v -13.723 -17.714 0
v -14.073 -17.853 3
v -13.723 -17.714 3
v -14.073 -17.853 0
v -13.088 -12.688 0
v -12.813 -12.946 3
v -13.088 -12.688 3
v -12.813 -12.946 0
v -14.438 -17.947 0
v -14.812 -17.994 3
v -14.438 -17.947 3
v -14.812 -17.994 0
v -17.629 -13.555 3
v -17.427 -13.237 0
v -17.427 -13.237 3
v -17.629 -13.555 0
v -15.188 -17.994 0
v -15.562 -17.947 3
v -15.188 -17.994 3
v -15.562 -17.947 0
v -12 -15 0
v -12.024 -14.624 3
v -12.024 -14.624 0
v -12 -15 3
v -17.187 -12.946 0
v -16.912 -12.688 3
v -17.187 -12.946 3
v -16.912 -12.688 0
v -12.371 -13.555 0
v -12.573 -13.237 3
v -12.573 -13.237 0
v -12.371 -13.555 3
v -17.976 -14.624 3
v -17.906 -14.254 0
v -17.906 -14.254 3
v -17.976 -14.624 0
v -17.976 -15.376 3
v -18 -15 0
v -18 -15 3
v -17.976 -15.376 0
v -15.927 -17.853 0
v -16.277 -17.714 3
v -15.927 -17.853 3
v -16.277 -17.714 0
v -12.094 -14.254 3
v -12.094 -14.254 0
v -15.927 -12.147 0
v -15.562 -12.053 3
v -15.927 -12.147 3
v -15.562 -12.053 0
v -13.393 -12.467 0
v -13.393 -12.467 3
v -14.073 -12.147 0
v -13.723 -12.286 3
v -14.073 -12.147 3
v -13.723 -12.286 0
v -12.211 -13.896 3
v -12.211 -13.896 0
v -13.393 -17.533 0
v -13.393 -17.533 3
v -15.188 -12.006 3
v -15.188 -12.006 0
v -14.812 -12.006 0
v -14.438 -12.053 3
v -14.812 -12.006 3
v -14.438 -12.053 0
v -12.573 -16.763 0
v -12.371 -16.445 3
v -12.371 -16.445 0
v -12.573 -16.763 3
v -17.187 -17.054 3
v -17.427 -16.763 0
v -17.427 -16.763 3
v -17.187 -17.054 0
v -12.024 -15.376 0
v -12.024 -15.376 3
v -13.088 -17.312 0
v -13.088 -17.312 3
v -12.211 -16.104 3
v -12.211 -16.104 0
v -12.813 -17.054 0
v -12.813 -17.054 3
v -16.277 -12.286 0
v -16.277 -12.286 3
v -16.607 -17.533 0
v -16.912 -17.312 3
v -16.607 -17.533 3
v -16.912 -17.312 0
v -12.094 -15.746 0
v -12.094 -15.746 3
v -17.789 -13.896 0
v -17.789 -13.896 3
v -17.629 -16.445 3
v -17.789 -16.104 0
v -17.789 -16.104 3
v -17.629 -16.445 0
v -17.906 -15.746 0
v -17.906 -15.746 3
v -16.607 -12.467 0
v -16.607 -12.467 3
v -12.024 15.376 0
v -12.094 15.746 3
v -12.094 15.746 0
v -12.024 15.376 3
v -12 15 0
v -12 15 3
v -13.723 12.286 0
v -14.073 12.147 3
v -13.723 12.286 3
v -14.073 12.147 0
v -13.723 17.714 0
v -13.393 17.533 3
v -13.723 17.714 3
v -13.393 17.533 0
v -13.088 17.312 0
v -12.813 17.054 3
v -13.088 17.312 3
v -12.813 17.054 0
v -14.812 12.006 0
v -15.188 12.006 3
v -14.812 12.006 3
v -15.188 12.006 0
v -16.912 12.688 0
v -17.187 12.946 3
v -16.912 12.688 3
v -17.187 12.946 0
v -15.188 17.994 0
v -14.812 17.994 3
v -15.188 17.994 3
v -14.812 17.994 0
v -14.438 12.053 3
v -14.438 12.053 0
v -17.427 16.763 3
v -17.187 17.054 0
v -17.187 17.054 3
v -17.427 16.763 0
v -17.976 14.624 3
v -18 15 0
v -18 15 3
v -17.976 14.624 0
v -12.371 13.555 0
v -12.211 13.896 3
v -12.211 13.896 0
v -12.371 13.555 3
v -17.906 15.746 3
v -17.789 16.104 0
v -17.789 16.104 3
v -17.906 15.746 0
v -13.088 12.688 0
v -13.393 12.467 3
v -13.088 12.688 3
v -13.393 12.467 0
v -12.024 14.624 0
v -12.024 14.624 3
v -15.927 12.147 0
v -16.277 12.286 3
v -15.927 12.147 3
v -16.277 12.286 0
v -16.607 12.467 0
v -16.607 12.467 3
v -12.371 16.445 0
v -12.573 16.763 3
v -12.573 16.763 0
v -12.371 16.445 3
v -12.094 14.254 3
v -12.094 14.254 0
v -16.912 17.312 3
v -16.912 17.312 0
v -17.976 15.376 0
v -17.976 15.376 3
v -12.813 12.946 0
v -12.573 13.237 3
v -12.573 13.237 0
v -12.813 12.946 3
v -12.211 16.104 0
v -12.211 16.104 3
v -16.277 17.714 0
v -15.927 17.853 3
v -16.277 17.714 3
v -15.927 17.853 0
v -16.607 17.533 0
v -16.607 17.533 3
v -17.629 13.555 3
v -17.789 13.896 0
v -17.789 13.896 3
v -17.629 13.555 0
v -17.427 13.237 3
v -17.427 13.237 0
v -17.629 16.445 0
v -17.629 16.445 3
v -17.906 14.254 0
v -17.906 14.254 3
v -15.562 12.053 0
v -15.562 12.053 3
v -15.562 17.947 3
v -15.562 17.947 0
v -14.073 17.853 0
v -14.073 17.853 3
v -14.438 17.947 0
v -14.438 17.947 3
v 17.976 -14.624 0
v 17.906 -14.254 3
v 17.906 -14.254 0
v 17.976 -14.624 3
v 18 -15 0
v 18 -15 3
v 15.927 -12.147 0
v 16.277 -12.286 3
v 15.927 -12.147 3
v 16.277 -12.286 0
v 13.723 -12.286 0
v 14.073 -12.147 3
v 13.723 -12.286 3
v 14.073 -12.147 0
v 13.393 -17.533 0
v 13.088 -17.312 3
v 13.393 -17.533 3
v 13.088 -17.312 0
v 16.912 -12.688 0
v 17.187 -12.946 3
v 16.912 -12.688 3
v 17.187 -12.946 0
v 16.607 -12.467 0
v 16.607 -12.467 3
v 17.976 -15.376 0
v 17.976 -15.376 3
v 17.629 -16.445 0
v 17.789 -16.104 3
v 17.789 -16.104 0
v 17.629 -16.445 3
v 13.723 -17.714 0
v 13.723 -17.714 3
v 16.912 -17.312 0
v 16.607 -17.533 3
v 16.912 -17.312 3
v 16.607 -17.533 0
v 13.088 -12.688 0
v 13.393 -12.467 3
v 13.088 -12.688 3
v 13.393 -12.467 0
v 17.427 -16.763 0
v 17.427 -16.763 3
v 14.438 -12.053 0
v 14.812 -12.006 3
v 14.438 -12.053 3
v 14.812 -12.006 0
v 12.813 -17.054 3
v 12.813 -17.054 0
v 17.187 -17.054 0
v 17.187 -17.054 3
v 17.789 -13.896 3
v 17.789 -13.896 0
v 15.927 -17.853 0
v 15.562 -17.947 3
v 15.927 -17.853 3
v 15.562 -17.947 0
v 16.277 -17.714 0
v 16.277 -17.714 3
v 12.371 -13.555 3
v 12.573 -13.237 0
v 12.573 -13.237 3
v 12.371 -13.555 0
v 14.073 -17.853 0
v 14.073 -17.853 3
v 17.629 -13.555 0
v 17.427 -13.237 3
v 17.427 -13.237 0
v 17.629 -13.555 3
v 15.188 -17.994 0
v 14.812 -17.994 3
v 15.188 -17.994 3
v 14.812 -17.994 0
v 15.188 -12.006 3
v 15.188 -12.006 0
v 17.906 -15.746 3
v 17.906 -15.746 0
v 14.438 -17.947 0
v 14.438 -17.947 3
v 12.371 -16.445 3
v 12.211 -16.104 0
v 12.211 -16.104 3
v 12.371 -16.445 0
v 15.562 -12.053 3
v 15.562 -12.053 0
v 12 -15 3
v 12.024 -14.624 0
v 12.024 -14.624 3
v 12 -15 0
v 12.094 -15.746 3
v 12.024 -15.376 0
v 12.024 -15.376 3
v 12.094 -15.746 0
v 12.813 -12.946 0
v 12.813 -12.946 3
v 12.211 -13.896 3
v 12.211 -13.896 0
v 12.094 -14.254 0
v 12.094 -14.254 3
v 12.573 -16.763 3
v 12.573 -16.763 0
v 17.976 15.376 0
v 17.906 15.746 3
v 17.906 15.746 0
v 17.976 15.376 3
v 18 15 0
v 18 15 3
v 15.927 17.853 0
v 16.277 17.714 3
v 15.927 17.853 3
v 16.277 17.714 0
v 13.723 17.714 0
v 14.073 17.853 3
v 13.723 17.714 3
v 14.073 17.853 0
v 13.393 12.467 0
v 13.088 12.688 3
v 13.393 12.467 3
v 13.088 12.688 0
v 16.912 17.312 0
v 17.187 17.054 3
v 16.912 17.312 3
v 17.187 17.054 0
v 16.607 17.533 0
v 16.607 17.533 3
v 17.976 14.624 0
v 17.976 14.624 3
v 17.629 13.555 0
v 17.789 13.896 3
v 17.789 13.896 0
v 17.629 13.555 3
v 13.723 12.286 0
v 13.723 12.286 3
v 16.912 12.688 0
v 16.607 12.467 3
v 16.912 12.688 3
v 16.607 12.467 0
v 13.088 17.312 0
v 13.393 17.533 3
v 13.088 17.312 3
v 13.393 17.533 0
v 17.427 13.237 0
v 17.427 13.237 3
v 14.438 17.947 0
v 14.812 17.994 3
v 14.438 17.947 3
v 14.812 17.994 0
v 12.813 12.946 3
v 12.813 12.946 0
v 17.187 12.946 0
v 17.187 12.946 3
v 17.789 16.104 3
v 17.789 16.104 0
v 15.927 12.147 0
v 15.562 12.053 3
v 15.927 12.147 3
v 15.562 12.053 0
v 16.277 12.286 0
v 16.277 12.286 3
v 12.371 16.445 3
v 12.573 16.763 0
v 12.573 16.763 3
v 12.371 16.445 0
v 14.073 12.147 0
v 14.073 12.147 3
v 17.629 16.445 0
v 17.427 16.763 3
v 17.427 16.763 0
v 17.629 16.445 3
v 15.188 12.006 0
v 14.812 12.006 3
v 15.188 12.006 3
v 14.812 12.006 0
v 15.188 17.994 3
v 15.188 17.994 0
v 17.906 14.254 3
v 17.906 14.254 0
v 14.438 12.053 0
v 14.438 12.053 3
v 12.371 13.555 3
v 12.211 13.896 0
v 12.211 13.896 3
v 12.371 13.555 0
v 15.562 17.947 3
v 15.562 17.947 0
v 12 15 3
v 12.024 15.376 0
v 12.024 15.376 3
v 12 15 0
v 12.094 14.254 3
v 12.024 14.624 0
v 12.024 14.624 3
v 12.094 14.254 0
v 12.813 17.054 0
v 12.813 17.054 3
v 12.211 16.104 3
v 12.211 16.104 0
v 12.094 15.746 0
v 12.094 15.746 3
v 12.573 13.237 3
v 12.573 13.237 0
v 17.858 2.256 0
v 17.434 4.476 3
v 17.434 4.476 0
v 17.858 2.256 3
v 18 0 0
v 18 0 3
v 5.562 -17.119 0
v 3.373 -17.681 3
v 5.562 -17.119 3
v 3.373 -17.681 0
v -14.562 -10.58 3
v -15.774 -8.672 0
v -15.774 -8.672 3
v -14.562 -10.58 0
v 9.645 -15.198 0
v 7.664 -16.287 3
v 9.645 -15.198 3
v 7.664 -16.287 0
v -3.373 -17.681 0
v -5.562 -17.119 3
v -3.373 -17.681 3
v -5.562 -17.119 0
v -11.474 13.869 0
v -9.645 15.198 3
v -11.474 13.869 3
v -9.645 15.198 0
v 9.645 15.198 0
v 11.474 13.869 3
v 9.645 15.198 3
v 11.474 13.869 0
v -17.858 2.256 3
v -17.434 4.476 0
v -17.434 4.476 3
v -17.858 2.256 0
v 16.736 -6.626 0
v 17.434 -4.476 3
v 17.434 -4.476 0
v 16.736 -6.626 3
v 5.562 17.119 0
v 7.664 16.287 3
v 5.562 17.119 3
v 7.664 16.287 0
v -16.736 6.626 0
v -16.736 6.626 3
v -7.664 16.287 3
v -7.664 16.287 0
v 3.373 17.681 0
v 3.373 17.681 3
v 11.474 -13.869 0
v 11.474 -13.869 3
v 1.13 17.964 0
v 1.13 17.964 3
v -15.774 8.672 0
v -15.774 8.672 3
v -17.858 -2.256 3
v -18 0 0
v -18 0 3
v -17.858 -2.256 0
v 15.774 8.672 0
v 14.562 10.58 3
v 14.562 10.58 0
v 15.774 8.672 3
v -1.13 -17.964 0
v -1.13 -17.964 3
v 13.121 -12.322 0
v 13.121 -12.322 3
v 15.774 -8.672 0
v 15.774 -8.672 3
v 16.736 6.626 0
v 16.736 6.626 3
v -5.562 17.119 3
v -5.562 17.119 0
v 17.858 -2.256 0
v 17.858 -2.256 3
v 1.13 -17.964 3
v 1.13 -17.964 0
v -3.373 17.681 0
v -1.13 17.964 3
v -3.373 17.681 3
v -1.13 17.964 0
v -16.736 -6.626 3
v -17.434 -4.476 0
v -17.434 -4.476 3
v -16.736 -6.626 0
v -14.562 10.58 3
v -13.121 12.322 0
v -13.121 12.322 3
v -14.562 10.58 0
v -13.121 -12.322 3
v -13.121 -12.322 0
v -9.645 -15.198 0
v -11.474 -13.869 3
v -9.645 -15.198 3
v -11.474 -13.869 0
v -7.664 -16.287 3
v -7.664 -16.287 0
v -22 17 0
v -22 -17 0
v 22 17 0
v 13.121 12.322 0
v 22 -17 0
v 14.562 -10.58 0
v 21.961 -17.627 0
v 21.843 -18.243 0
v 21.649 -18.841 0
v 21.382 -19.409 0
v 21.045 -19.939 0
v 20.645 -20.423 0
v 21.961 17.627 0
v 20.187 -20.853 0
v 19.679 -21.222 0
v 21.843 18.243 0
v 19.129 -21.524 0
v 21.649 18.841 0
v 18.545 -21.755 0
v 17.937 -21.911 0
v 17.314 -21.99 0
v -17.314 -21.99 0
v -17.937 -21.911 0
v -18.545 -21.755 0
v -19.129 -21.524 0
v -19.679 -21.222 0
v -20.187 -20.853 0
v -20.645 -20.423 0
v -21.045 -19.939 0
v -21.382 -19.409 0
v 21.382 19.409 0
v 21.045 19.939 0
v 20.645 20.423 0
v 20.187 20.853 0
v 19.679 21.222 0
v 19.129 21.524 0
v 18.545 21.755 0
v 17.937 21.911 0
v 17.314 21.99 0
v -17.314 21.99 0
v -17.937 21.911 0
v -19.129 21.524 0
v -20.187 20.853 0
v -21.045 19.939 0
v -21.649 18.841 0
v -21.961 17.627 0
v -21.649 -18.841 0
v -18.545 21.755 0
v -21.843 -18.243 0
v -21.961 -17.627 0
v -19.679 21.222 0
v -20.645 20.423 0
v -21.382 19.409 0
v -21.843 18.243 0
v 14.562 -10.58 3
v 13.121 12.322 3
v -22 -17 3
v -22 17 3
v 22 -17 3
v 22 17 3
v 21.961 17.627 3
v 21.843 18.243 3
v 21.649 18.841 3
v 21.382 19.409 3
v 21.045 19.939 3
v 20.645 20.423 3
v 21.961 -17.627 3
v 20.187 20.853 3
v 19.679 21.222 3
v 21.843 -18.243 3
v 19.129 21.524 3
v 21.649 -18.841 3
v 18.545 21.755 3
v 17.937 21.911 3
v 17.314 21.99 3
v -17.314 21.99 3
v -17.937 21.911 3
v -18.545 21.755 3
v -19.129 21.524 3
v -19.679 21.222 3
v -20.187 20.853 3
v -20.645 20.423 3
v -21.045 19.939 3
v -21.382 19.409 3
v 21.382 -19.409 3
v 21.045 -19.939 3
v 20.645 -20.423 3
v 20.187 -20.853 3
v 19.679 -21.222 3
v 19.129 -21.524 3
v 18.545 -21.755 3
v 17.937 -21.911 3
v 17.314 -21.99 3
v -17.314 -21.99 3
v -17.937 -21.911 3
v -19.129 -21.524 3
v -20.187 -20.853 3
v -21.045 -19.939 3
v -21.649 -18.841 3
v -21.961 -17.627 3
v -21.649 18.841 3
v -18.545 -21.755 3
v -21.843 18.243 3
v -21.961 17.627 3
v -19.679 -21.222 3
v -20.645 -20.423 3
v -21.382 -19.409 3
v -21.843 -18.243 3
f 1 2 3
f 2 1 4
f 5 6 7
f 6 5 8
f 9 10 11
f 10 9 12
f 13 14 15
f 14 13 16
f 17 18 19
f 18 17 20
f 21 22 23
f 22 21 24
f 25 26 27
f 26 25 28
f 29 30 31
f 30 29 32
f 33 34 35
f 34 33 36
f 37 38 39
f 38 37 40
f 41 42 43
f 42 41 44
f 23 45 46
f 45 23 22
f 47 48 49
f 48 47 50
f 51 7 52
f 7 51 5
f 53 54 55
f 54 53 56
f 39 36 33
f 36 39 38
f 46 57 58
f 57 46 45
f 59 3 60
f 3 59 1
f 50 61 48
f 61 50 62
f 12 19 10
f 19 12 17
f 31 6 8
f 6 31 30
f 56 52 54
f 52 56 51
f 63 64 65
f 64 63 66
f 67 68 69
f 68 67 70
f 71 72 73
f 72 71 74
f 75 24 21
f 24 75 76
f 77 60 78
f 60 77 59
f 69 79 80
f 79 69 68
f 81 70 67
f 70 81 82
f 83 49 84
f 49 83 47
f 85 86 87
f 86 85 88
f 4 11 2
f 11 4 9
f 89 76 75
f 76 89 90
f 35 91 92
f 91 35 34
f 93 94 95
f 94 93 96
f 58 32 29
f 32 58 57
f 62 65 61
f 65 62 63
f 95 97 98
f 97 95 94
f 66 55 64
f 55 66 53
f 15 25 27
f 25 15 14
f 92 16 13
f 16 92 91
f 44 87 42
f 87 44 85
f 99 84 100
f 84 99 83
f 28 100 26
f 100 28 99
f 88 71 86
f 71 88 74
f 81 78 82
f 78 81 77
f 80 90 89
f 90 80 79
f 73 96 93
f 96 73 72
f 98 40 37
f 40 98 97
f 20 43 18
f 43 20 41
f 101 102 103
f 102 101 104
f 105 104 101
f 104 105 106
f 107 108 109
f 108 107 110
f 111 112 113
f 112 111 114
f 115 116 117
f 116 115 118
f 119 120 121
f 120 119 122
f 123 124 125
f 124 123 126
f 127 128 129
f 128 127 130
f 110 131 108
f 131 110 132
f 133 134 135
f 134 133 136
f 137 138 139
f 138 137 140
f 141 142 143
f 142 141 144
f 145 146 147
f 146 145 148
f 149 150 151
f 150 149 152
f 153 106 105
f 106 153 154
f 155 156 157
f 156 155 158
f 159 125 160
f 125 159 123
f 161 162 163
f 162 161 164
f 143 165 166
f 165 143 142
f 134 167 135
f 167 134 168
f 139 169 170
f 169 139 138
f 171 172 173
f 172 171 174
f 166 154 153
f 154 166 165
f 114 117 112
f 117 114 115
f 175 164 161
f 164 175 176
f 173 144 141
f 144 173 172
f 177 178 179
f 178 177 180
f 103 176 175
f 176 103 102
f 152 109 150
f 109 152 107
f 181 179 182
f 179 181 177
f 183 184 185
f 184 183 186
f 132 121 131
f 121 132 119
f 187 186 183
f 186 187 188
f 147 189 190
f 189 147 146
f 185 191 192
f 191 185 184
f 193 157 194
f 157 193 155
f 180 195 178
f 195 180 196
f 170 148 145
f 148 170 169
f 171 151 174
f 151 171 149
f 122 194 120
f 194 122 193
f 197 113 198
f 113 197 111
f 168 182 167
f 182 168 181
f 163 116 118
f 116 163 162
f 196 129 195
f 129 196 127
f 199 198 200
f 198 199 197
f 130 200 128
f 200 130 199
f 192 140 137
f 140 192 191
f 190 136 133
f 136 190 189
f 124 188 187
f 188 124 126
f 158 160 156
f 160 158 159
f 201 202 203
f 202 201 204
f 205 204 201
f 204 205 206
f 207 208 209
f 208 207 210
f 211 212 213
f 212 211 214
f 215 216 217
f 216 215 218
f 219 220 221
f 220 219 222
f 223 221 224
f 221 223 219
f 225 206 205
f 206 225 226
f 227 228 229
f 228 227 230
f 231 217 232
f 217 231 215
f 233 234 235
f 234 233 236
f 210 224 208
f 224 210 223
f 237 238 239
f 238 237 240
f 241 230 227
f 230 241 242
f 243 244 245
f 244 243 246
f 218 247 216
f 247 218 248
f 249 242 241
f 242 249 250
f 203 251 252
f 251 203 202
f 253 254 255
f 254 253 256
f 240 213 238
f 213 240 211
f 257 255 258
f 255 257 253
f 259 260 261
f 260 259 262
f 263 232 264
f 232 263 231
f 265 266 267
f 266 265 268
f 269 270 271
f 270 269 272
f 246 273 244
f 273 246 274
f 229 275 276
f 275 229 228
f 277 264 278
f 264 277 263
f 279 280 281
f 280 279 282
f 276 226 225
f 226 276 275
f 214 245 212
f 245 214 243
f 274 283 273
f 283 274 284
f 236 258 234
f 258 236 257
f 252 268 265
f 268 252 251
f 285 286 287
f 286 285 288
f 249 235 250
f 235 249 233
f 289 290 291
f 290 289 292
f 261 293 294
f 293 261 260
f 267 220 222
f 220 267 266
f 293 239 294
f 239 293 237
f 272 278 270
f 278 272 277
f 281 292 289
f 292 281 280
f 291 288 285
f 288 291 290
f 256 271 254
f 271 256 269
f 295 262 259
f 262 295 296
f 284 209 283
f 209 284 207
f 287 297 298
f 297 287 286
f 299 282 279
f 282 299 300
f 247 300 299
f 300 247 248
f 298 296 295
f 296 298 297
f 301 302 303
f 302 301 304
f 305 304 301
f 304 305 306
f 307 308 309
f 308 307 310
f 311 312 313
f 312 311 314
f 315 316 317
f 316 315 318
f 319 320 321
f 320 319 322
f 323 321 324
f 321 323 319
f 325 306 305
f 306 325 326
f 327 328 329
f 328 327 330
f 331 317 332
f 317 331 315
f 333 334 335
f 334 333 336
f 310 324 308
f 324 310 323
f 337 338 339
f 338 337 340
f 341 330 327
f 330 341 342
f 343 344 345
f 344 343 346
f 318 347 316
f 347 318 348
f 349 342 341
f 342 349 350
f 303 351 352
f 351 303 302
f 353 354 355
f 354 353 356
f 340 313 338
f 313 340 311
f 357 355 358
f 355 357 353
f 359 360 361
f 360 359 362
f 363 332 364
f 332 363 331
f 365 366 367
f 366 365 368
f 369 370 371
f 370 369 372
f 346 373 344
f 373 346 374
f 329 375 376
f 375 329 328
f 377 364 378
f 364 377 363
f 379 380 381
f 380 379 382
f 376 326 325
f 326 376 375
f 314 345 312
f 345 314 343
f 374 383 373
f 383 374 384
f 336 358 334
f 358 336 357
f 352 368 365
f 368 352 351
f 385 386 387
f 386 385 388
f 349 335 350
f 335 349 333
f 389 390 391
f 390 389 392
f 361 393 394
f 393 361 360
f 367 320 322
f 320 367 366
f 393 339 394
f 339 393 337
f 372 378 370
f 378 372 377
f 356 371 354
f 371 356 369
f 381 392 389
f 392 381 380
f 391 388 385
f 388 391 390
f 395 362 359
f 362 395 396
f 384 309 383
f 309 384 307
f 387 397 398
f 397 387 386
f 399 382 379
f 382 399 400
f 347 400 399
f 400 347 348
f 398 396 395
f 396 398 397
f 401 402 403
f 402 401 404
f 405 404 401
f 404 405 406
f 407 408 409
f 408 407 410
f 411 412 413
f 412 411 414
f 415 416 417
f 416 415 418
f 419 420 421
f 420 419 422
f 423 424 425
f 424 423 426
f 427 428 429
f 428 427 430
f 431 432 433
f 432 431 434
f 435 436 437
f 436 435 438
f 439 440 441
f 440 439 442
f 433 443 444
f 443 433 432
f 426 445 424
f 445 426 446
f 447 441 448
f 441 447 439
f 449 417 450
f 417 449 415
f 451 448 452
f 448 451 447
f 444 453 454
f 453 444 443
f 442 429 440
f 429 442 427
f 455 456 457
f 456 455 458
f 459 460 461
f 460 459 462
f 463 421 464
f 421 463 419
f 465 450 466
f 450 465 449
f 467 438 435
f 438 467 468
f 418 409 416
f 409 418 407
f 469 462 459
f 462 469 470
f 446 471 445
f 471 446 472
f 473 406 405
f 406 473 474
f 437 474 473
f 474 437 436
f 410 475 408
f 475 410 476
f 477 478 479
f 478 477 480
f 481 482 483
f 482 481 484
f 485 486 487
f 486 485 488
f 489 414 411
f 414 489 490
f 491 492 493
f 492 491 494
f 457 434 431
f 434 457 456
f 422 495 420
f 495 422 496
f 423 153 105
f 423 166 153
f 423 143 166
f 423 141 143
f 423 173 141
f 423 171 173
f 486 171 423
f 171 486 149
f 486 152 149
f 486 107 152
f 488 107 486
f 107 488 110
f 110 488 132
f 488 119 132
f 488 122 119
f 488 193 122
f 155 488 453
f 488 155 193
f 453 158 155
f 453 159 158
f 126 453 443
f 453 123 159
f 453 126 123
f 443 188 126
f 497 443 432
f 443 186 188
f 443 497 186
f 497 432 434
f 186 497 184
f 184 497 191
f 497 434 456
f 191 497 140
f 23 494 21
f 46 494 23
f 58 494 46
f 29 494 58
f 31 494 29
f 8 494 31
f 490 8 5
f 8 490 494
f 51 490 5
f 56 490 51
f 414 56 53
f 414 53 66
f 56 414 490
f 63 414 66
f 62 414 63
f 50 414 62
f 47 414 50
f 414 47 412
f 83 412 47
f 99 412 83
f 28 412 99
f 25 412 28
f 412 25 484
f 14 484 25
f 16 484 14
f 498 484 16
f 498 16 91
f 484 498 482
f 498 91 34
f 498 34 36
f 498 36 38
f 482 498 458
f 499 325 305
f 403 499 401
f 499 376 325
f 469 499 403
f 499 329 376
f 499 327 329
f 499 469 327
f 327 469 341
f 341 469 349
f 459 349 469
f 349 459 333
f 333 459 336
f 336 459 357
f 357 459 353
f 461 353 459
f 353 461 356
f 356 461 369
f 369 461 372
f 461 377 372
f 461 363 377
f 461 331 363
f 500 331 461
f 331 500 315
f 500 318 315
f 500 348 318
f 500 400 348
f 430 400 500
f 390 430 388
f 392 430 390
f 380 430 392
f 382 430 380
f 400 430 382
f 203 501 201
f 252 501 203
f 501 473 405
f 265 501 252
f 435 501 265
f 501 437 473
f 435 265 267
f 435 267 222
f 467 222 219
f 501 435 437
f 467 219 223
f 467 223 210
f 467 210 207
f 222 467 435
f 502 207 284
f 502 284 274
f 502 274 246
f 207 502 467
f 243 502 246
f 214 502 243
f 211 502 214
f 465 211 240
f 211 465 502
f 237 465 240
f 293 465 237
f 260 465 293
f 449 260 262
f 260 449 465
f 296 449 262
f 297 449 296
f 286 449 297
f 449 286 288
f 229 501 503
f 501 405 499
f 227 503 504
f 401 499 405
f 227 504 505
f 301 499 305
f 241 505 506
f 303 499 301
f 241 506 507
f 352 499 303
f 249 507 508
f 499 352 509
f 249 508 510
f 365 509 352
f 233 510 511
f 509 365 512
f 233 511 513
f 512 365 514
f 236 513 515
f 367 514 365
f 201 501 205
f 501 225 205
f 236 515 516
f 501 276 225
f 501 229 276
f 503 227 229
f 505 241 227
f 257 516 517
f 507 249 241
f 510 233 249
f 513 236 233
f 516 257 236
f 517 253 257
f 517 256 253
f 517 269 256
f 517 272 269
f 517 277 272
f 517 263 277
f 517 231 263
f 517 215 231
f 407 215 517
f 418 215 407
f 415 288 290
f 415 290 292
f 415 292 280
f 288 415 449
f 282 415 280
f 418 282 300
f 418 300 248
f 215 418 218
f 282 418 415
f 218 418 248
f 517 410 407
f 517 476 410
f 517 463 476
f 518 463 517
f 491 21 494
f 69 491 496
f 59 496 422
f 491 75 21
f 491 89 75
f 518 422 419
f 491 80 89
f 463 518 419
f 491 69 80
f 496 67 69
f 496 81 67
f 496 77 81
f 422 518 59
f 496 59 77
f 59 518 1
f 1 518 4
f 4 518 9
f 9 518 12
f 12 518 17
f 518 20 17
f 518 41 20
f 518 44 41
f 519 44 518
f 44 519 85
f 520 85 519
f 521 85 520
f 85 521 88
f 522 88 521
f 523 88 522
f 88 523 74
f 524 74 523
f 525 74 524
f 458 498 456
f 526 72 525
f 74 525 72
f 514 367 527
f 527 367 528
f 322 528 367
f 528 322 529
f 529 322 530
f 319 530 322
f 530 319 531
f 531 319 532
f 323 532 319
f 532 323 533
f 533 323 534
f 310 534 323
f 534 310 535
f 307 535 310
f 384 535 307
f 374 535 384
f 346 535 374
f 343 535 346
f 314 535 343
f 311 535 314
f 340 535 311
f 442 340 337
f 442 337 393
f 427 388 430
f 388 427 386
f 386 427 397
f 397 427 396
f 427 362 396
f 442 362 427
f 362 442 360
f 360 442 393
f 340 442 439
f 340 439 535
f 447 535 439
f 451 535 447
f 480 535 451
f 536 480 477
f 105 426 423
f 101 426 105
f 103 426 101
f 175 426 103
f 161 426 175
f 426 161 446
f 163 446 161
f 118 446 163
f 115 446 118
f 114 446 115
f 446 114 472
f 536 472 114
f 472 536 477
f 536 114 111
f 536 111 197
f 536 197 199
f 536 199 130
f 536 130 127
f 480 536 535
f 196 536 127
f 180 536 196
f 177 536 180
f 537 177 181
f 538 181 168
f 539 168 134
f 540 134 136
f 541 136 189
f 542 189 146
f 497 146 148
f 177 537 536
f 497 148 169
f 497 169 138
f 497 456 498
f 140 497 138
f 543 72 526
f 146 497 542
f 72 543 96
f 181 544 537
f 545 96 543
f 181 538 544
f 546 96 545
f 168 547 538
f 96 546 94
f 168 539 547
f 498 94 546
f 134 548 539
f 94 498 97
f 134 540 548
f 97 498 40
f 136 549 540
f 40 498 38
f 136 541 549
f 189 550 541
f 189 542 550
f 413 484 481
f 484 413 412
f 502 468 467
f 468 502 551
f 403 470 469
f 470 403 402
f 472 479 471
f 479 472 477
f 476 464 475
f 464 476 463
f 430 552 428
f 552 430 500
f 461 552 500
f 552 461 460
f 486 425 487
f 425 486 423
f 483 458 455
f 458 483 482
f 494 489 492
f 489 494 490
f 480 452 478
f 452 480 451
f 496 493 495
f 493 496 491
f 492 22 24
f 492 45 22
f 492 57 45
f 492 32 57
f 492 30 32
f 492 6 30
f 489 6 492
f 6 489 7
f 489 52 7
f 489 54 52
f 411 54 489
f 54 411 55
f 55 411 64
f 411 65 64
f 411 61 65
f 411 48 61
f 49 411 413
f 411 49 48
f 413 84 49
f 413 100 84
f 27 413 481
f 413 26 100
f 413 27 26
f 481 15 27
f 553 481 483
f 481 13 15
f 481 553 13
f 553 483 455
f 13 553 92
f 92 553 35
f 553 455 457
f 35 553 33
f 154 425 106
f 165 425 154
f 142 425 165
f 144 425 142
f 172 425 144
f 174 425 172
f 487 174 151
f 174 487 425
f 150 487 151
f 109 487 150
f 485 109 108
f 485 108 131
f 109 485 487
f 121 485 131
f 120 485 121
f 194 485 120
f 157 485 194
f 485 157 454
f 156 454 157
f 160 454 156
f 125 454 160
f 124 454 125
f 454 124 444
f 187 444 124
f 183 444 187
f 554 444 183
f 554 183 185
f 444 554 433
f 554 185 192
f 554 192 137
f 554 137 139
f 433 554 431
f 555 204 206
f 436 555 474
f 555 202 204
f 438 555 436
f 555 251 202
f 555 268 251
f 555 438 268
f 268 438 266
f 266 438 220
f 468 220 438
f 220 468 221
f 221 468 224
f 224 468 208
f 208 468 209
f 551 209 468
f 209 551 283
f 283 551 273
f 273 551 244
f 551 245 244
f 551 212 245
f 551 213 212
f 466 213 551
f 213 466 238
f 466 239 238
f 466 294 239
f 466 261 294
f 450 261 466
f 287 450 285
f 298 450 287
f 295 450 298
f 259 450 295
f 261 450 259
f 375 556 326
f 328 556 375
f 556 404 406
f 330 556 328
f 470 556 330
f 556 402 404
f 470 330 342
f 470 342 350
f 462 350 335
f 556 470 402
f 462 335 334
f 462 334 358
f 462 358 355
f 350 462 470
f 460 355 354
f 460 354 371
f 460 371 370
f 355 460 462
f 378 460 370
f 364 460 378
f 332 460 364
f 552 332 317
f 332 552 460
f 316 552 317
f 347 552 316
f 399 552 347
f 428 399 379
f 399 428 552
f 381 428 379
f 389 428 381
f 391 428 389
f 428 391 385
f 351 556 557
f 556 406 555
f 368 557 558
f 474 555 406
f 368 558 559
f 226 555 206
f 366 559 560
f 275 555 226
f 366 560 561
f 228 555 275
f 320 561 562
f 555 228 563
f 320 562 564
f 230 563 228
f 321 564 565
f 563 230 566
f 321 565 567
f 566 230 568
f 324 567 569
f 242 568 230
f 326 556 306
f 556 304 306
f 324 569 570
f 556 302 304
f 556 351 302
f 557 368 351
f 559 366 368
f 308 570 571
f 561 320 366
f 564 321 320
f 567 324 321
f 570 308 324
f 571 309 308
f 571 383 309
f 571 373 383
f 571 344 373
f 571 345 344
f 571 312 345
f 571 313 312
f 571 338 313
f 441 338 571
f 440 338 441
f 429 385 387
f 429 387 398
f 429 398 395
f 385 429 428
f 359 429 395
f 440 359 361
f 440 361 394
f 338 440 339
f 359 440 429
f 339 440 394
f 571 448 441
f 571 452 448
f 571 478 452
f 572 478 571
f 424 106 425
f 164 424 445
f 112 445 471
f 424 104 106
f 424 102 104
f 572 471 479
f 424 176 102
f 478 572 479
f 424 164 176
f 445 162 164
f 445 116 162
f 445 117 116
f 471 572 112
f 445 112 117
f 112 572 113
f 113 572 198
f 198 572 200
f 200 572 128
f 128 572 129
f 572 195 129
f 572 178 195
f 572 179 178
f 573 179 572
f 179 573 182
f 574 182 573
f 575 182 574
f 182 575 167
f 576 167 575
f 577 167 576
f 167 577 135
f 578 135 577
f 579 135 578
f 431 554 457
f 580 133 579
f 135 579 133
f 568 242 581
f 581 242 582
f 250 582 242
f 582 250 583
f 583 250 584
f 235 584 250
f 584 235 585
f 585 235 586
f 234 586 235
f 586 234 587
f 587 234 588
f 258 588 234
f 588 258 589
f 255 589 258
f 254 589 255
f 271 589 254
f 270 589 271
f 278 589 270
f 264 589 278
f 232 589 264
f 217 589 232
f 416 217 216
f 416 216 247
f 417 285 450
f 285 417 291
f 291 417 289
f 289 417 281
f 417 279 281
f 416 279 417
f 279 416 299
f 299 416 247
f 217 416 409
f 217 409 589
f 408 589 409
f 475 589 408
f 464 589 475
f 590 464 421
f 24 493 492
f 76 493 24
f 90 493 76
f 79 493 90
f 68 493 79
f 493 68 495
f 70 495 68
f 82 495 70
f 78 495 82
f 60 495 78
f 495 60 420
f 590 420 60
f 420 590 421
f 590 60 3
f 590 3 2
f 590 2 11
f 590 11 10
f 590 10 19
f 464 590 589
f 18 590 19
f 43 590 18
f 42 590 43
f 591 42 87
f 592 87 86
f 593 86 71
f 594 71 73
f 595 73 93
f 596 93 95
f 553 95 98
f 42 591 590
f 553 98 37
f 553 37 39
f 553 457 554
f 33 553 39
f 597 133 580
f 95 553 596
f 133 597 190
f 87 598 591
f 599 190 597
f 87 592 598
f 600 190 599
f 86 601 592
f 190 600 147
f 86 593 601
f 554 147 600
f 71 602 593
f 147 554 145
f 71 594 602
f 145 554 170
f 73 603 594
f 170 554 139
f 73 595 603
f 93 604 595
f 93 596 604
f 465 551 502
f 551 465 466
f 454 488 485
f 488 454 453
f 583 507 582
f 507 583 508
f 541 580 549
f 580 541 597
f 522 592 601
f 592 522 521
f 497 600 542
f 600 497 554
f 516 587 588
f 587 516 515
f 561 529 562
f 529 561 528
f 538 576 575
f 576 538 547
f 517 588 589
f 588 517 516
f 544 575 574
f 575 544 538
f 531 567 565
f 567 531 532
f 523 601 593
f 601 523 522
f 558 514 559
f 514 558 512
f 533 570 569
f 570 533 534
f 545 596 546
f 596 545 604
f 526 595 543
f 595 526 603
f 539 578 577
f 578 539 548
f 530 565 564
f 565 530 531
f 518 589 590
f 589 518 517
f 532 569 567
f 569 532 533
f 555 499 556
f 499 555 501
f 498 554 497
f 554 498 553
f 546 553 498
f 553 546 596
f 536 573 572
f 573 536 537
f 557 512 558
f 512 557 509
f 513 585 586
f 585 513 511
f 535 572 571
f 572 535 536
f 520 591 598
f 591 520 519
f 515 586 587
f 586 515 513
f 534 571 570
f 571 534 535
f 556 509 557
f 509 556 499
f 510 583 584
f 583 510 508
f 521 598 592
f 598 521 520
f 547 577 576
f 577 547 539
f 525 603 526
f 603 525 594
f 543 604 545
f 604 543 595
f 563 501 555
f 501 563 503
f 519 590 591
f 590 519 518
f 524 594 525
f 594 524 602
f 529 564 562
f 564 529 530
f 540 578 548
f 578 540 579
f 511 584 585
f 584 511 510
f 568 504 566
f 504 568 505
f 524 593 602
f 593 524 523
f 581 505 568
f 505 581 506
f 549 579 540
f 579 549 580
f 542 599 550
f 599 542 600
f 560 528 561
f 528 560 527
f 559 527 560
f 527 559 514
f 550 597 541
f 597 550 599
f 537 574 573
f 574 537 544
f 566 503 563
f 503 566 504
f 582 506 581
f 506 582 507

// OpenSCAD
$fn = 50;


difference() {
	union() {
		hull() {
			translate(v = [-17.0000000000, 17.0000000000, 0]) {
				cylinder(h = 3, r = 5);
			}
			translate(v = [17.0000000000, 17.0000000000, 0]) {
				cylinder(h = 3, r = 5);
			}
			translate(v = [-17.0000000000, -17.0000000000, 0]) {
				cylinder(h = 3, r = 5);
			}
			translate(v = [17.0000000000, -17.0000000000, 0]) {
				cylinder(h = 3, r = 5);
			}
		}
	}
	union() {
		#translate(v = [-15.0000000000, -15.0000000000, -100.0000000000]) {
			cylinder(h = 200, r = 3.0000000000);
		}
		#translate(v = [-15.0000000000, 15.0000000000, -100.0000000000]) {
			cylinder(h = 200, r = 3.0000000000);
		}
		#translate(v = [15.0000000000, -15.0000000000, -100.0000000000]) {
			cylinder(h = 200, r = 3.0000000000);
		}
		#translate(v = [15.0000000000, 15.0000000000, -100.0000000000]) {
			cylinder(h = 200, r = 3.0000000000);
		}
		#cylinder(h = 3, r = 18.0000000000);
	}
}
